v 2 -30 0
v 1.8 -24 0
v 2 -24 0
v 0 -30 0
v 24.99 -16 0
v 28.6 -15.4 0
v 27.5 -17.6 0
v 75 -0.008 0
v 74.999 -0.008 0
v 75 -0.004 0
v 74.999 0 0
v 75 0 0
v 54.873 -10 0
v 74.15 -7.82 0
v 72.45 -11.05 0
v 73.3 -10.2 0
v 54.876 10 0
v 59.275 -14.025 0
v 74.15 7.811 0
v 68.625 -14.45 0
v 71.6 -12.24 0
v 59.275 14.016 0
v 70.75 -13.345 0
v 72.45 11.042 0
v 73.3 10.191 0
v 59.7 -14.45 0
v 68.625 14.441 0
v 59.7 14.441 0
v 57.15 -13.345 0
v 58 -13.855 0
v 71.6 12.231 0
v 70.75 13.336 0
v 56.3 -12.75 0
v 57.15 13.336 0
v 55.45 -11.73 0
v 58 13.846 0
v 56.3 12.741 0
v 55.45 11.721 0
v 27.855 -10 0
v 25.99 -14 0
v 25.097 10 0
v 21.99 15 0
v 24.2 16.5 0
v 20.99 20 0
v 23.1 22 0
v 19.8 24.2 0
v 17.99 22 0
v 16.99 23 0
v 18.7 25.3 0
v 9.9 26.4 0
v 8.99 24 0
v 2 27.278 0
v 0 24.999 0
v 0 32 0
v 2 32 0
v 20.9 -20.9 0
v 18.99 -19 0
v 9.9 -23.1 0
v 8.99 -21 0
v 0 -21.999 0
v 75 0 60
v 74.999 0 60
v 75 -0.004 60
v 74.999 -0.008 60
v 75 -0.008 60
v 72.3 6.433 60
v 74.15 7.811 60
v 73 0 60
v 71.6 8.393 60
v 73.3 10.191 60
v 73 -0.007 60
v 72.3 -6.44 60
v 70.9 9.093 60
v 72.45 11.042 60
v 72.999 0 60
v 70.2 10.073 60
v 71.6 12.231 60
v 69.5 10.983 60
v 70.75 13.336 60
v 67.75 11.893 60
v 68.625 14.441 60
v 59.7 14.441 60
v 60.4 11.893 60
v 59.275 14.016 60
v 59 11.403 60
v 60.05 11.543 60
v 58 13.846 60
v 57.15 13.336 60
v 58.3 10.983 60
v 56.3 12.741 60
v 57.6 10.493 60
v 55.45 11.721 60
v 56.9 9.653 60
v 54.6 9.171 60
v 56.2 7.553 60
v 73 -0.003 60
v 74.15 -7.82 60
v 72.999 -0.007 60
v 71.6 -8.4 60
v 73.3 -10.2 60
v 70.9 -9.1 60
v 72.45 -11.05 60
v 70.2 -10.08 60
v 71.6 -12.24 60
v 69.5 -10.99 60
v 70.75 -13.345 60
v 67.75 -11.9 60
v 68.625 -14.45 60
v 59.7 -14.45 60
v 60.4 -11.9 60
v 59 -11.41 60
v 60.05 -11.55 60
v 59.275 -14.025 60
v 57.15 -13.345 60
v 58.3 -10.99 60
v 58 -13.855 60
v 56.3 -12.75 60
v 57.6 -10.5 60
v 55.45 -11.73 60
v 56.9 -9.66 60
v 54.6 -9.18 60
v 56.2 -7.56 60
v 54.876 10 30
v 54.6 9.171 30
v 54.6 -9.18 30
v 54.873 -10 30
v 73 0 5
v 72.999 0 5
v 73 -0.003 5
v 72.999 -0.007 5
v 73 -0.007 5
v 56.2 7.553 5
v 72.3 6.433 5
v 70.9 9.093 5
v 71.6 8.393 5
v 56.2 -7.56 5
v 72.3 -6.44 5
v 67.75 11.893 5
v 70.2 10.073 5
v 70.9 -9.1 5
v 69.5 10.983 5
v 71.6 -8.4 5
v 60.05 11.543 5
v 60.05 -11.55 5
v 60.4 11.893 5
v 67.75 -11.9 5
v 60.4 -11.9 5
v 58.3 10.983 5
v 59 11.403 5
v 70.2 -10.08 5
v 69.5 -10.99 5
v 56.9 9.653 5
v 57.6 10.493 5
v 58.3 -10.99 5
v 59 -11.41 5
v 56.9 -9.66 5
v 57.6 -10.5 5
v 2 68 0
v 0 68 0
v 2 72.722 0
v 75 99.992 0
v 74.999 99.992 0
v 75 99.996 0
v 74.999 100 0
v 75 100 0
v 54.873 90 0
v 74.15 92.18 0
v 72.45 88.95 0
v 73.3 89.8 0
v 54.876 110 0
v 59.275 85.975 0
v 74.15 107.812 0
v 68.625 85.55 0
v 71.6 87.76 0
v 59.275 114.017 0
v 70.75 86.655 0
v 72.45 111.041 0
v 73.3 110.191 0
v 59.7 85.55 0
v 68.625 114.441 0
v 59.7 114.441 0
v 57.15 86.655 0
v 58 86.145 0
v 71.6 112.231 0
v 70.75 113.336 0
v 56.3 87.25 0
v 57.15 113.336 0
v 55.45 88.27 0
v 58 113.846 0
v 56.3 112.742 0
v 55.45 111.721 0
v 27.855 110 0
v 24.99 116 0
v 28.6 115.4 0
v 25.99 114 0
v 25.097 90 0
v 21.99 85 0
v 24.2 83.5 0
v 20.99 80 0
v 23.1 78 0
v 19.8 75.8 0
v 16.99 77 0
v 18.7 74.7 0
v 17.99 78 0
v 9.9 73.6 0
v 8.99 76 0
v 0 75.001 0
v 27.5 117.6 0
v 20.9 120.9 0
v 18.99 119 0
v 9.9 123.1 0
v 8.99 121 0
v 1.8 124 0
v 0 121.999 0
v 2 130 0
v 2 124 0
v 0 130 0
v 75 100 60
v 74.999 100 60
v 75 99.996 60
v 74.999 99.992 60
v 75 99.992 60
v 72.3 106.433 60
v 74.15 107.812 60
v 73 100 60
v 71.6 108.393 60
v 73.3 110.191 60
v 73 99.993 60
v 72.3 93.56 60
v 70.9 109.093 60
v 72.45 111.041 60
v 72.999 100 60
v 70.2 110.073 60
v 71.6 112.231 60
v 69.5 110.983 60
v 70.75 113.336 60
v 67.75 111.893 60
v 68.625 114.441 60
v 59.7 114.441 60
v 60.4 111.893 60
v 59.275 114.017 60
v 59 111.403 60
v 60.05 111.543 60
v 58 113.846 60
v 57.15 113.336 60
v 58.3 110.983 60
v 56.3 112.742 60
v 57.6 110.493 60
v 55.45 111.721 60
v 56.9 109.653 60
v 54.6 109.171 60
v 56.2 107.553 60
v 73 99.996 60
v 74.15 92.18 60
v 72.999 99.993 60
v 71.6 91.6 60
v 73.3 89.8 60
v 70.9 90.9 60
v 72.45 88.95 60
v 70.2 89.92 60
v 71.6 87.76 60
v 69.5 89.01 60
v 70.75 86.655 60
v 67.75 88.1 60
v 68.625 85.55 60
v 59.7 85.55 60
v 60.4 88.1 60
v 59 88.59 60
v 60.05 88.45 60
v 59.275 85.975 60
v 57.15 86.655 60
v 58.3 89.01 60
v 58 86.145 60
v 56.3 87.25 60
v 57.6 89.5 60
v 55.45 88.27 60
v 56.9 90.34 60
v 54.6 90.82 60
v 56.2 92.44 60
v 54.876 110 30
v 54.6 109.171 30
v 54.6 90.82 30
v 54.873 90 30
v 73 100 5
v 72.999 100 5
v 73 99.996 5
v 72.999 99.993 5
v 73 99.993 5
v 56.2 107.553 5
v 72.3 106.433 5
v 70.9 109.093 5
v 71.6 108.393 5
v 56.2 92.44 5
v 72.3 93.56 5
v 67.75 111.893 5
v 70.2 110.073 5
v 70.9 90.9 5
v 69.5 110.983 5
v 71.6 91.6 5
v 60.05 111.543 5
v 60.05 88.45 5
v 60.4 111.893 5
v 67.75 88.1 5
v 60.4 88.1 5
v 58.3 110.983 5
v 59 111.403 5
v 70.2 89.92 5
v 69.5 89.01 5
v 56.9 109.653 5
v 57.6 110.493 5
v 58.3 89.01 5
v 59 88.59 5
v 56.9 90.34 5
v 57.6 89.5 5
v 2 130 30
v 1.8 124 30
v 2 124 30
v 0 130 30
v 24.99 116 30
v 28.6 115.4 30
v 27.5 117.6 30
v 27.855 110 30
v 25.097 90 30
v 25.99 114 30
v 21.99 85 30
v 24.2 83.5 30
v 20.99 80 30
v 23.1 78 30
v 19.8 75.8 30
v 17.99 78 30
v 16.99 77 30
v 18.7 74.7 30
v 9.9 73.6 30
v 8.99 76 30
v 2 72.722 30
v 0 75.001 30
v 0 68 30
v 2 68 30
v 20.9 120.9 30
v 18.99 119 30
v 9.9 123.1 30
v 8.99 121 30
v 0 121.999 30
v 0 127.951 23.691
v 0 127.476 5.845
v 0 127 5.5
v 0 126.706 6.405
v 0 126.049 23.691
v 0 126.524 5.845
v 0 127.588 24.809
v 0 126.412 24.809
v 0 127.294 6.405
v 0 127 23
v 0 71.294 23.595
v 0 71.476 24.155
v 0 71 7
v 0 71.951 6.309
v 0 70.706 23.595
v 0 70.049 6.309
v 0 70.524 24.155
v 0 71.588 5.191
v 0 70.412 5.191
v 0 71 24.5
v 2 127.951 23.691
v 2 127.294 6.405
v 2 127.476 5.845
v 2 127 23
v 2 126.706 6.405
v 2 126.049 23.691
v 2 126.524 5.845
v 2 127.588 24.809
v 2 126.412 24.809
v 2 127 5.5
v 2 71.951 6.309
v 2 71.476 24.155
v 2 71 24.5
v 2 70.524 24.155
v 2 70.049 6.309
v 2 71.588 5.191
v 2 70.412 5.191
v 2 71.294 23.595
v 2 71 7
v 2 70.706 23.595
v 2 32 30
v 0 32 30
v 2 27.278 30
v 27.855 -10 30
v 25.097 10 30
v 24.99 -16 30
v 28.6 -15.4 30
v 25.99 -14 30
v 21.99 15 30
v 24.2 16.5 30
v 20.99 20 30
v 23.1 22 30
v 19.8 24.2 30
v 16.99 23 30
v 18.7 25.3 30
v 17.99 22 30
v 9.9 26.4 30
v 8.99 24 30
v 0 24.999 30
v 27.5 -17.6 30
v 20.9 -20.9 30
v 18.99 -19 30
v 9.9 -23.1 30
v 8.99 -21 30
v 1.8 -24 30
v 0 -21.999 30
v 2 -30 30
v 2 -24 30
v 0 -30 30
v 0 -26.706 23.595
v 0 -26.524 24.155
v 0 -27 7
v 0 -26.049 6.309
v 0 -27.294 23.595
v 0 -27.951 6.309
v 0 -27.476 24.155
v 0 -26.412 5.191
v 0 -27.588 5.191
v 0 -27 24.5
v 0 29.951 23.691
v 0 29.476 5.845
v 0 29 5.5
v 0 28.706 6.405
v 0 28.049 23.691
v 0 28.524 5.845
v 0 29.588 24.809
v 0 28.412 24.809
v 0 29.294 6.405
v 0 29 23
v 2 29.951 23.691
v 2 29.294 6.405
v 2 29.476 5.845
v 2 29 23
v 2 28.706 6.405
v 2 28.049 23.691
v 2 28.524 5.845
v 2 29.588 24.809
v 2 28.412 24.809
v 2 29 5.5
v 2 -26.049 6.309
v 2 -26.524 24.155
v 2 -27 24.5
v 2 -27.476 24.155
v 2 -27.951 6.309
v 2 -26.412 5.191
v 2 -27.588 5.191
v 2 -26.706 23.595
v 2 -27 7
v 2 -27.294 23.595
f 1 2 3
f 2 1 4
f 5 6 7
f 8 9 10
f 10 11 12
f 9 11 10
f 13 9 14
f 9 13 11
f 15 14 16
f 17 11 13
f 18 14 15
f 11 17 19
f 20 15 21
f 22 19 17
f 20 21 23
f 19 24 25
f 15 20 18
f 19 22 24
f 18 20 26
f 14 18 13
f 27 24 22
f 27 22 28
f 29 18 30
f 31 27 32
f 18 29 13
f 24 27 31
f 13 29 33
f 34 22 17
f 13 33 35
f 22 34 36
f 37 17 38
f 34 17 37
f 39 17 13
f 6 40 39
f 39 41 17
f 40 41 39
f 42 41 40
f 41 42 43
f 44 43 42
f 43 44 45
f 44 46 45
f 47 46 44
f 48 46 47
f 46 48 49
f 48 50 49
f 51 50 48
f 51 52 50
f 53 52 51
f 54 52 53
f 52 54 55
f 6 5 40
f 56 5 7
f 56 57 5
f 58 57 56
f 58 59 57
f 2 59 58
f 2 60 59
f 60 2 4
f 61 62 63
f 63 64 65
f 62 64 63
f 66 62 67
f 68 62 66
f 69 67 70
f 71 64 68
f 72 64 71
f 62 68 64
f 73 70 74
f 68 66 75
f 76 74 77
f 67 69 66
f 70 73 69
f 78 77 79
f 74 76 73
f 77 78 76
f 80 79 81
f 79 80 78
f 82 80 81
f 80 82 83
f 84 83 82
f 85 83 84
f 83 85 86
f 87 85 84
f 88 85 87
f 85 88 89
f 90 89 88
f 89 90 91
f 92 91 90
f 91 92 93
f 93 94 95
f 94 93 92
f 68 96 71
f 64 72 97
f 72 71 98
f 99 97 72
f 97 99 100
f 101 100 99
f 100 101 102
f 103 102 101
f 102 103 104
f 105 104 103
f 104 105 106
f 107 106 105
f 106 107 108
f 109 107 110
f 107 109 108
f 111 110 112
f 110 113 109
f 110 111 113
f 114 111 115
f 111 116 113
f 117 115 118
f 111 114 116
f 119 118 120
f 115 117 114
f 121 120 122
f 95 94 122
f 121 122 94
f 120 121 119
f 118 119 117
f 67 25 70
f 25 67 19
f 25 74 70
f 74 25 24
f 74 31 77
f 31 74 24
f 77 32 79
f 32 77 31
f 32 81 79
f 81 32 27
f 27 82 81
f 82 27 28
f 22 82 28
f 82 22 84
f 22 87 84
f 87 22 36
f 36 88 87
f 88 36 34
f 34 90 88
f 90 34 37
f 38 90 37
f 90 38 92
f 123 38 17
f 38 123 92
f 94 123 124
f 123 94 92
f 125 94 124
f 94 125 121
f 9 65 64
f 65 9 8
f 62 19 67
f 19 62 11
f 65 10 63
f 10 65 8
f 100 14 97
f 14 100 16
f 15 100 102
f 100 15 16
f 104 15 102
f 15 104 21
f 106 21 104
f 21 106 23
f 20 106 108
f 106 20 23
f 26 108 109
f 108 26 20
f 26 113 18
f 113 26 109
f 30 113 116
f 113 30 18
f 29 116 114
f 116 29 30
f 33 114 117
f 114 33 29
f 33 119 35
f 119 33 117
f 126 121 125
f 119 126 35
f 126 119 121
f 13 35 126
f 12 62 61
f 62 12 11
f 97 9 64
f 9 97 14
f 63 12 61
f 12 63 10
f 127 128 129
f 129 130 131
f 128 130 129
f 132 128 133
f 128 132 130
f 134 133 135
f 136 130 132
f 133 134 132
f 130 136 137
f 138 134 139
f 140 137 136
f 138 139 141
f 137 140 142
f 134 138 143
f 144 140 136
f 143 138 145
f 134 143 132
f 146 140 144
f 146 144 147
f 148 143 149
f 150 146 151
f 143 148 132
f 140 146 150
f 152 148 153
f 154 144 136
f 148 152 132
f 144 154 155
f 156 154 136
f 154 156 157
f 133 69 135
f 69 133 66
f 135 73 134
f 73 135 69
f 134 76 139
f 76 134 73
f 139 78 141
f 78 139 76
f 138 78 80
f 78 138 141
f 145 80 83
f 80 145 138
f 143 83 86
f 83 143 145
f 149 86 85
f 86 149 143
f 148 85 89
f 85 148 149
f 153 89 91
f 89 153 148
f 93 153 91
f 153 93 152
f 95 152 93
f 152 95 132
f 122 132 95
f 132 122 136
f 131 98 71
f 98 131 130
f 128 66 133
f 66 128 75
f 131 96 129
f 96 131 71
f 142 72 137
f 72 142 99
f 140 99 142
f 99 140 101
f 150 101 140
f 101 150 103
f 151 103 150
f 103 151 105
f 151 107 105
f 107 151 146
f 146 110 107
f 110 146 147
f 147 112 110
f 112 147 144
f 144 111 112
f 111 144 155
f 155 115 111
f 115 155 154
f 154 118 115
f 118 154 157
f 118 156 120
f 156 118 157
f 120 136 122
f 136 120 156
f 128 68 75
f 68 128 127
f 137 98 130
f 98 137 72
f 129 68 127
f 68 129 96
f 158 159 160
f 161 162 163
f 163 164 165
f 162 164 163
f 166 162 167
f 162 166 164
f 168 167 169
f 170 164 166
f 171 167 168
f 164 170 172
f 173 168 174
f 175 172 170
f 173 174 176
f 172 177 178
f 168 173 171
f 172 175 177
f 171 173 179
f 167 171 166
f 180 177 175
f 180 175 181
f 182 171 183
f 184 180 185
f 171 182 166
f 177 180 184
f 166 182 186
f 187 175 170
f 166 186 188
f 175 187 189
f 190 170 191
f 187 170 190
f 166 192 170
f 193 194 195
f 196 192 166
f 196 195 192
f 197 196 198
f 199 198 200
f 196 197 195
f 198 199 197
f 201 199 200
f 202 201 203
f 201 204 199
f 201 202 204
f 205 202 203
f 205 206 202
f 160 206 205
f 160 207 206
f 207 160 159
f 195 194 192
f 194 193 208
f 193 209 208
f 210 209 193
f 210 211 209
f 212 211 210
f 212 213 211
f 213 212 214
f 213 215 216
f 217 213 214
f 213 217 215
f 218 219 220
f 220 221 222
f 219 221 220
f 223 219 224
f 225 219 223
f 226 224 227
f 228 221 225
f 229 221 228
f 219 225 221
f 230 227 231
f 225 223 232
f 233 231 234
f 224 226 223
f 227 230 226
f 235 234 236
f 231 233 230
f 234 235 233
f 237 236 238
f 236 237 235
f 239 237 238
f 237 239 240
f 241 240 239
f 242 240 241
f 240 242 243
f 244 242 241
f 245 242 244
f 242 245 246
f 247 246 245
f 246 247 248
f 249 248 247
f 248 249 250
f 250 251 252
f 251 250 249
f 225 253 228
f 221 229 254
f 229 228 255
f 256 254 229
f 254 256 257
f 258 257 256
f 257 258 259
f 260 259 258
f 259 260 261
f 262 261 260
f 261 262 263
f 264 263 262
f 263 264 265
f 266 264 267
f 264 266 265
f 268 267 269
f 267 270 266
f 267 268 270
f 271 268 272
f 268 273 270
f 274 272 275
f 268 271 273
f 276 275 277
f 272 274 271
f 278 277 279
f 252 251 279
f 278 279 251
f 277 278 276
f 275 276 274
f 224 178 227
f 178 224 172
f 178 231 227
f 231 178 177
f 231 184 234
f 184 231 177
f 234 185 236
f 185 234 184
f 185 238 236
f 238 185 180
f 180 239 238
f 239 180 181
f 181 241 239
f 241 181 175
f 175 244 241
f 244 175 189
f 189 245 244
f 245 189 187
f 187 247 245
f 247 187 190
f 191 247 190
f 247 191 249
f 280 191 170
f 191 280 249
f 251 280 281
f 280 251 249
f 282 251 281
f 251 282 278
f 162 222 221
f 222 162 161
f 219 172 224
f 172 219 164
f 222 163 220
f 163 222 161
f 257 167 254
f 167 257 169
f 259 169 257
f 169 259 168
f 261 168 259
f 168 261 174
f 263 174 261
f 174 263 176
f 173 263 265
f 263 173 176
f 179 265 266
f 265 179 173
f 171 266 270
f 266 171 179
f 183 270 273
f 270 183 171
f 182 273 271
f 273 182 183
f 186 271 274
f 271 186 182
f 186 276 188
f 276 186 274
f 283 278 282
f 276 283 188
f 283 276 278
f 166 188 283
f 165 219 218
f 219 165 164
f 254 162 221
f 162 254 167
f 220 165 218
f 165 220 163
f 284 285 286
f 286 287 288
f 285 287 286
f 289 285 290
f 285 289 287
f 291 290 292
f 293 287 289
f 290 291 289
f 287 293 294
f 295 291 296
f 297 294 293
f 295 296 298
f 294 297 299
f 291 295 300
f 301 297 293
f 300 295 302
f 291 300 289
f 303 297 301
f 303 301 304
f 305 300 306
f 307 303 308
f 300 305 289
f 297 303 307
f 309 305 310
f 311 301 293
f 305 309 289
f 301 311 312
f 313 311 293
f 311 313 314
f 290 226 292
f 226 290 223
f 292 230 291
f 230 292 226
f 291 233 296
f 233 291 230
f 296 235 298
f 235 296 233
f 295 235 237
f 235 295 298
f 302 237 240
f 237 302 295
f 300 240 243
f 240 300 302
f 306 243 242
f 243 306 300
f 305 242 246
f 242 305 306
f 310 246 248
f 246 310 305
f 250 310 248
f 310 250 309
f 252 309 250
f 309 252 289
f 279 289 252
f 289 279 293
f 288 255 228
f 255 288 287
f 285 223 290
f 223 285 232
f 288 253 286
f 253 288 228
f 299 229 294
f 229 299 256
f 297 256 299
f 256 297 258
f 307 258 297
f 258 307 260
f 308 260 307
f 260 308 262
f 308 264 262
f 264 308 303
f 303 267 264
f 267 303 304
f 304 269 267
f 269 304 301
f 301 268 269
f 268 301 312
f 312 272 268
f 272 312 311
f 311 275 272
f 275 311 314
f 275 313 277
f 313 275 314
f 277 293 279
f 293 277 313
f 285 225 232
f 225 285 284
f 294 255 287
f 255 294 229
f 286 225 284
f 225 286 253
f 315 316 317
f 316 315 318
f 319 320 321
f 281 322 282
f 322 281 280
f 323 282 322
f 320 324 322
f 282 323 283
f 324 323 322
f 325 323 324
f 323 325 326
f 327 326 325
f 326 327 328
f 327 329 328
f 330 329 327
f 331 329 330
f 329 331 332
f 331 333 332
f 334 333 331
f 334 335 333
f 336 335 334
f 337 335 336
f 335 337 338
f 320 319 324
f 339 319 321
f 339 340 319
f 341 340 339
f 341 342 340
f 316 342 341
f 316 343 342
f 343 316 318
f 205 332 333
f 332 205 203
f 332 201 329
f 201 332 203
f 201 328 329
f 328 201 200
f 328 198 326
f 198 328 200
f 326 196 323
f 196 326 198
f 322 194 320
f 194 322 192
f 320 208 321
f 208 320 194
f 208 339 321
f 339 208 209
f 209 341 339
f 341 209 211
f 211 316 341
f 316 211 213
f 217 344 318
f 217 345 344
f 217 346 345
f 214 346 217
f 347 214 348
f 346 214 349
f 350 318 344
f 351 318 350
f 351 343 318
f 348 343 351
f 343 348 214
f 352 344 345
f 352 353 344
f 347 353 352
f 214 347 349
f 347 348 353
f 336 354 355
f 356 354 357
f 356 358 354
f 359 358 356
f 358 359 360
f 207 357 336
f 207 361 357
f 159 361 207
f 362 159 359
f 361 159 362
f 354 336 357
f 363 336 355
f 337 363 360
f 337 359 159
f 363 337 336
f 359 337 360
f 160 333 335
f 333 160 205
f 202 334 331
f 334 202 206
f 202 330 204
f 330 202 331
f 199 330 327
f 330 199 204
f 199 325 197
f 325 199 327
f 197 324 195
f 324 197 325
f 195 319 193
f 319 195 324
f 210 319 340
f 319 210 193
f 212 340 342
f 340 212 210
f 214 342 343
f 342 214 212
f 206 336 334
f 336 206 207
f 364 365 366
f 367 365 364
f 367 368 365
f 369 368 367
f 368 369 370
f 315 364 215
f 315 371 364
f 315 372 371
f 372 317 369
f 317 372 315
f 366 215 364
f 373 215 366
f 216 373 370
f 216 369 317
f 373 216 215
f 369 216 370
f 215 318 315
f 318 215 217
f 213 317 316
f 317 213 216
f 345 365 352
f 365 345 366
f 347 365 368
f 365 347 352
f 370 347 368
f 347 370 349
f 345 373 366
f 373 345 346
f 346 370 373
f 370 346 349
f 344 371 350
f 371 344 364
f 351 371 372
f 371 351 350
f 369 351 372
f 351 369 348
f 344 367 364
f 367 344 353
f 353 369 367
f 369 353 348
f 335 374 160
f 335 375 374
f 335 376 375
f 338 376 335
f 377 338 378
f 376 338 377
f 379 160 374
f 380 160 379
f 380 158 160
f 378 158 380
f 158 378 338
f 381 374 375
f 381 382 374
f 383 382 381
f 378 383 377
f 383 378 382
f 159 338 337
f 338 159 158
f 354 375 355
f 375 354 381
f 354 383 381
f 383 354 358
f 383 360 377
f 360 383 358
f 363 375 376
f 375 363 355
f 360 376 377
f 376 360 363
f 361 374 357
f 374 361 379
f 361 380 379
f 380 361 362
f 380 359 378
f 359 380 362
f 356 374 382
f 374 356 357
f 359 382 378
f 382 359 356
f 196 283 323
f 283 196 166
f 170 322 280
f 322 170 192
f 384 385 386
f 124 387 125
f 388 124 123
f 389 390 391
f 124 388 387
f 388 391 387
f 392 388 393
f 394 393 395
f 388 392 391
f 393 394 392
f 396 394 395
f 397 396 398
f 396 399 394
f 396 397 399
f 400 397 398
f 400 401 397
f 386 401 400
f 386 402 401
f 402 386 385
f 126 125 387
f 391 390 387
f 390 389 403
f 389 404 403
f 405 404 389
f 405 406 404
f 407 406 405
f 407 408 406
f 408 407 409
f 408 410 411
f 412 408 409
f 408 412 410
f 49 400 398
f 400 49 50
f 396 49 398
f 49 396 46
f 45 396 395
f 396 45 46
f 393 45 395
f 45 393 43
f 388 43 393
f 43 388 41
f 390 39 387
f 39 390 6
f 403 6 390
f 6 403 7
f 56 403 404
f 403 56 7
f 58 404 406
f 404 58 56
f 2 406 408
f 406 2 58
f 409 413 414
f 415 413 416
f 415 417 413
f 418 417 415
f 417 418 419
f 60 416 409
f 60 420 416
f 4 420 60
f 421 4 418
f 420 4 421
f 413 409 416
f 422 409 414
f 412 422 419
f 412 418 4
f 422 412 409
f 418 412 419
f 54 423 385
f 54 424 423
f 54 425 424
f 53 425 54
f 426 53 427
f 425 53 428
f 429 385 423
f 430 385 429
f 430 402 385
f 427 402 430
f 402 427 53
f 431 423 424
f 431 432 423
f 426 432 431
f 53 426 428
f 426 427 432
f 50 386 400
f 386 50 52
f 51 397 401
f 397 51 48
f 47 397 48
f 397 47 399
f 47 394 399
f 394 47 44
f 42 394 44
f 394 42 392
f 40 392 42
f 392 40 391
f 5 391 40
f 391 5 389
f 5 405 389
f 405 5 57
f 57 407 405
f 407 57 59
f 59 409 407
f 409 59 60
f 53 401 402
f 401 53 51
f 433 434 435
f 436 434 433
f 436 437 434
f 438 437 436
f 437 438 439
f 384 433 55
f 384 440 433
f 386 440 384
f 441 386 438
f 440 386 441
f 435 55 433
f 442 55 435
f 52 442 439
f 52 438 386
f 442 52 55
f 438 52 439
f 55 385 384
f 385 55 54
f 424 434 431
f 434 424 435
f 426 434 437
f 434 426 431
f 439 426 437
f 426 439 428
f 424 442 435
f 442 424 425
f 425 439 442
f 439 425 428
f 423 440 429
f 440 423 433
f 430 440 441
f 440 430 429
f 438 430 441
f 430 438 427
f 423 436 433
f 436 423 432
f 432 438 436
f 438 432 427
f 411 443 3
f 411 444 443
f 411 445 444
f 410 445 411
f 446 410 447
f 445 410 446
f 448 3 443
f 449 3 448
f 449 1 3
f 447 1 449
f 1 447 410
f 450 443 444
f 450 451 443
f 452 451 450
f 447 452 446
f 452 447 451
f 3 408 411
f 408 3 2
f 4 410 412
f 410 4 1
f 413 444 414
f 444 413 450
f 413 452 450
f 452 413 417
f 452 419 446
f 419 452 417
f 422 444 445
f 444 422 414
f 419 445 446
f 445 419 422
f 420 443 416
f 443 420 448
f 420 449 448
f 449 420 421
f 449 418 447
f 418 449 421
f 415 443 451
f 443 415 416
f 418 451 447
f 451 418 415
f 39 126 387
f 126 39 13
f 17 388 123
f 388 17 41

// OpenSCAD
height = 30;

module pipeOuterPolygonHalf() {
    linear_extrude(height)
        polygon([[0,0],
            [9,1],
            [17,2],
            [18,3],
            [21,5],
            [22,10],
            [26,39],
            [25,41],
            [19,44],
            [9,46],
            [0,47]
            ]);
}

module halfPipe() {
    difference() {
        scale([1.1,1.1,1])
            translate([0,-25,0])
                pipeOuterPolygonHalf();
        scale([1,1,1.1])
            translate([-0.01,-25,-0.1])
                pipeOuterPolygonHalf();
    }
}

module pipeInnerPolygonHalf() {
    linear_extrude(height*2)
        polygon([[0,0],
            [9.2,1],
            [12,2],
            [13,3],
            [14.4,4],
            [15.7,5],
            [17,7.5],
            [17,18],
            [16.5,18.5],
            [16.3,20],
            [15.7,21],
            [15,22],
            [13.8,23],
            [10.8,24],
            [0,24]
            ]);
}

module pipePolygonFull() {
    union() {
        // Nudge to get rid of the line of mirror
        translate([-0.01,0,0])
            pipeInnerPolygonHalf();
        mirror([1,0,0])
            pipeInnerPolygonHalf();
    }
}

module pipeInner() {
    difference() {
        scale([0.85,0.85,1])
            pipePolygonFull();
        translate([0,2,5])
            scale([0.7,0.7,1.2])
                pipePolygonFull();
    }
}

module connector() {
    linear_extrude(height)
        polygon([[27,10],
            [55,10],
            [55,-10],
            [25,-10]
            ]);
}

flangeThickness = 2;
flangeWidth = 6;

module screwHole(holeDiameter) {
    rotate([0,90,0])
        cylinder(h = flangeThickness*2, d = holeDiameter);
}

module screwFlange() {
    translate([0,24,0])
        difference() {
            cube([flangeThickness,flangeWidth,height]);
            translate([-0.2, flangeWidth/2, height*0.2])
                screwHole(1);
            translate([-0.2, flangeWidth/2, height*0.8])
                screwHole(2);
        }
}

module rightClip() {
    translate([75,0,0])
        rotate([0,0,90])
            pipeInner();
    connector();
    halfPipe();
    screwFlange();
    mirror([0, 0, 1])
        translate([0,-50-flangeWidth,-height])
            screwFlange();
}

module leftClip() {
    translate([75,0,0])
        rotate([0,0,90])
            pipeInner();
    mirror([0,1,0])
        connector();
    mirror([0,1,0])
        halfPipe();
    translate([0,2,0])
        screwFlange();
    mirror([0, 0, 1])
        translate([0,-48-flangeWidth,-height])
            screwFlange();
}

translate([0, 100, 0])
    rightClip();

leftClip();
